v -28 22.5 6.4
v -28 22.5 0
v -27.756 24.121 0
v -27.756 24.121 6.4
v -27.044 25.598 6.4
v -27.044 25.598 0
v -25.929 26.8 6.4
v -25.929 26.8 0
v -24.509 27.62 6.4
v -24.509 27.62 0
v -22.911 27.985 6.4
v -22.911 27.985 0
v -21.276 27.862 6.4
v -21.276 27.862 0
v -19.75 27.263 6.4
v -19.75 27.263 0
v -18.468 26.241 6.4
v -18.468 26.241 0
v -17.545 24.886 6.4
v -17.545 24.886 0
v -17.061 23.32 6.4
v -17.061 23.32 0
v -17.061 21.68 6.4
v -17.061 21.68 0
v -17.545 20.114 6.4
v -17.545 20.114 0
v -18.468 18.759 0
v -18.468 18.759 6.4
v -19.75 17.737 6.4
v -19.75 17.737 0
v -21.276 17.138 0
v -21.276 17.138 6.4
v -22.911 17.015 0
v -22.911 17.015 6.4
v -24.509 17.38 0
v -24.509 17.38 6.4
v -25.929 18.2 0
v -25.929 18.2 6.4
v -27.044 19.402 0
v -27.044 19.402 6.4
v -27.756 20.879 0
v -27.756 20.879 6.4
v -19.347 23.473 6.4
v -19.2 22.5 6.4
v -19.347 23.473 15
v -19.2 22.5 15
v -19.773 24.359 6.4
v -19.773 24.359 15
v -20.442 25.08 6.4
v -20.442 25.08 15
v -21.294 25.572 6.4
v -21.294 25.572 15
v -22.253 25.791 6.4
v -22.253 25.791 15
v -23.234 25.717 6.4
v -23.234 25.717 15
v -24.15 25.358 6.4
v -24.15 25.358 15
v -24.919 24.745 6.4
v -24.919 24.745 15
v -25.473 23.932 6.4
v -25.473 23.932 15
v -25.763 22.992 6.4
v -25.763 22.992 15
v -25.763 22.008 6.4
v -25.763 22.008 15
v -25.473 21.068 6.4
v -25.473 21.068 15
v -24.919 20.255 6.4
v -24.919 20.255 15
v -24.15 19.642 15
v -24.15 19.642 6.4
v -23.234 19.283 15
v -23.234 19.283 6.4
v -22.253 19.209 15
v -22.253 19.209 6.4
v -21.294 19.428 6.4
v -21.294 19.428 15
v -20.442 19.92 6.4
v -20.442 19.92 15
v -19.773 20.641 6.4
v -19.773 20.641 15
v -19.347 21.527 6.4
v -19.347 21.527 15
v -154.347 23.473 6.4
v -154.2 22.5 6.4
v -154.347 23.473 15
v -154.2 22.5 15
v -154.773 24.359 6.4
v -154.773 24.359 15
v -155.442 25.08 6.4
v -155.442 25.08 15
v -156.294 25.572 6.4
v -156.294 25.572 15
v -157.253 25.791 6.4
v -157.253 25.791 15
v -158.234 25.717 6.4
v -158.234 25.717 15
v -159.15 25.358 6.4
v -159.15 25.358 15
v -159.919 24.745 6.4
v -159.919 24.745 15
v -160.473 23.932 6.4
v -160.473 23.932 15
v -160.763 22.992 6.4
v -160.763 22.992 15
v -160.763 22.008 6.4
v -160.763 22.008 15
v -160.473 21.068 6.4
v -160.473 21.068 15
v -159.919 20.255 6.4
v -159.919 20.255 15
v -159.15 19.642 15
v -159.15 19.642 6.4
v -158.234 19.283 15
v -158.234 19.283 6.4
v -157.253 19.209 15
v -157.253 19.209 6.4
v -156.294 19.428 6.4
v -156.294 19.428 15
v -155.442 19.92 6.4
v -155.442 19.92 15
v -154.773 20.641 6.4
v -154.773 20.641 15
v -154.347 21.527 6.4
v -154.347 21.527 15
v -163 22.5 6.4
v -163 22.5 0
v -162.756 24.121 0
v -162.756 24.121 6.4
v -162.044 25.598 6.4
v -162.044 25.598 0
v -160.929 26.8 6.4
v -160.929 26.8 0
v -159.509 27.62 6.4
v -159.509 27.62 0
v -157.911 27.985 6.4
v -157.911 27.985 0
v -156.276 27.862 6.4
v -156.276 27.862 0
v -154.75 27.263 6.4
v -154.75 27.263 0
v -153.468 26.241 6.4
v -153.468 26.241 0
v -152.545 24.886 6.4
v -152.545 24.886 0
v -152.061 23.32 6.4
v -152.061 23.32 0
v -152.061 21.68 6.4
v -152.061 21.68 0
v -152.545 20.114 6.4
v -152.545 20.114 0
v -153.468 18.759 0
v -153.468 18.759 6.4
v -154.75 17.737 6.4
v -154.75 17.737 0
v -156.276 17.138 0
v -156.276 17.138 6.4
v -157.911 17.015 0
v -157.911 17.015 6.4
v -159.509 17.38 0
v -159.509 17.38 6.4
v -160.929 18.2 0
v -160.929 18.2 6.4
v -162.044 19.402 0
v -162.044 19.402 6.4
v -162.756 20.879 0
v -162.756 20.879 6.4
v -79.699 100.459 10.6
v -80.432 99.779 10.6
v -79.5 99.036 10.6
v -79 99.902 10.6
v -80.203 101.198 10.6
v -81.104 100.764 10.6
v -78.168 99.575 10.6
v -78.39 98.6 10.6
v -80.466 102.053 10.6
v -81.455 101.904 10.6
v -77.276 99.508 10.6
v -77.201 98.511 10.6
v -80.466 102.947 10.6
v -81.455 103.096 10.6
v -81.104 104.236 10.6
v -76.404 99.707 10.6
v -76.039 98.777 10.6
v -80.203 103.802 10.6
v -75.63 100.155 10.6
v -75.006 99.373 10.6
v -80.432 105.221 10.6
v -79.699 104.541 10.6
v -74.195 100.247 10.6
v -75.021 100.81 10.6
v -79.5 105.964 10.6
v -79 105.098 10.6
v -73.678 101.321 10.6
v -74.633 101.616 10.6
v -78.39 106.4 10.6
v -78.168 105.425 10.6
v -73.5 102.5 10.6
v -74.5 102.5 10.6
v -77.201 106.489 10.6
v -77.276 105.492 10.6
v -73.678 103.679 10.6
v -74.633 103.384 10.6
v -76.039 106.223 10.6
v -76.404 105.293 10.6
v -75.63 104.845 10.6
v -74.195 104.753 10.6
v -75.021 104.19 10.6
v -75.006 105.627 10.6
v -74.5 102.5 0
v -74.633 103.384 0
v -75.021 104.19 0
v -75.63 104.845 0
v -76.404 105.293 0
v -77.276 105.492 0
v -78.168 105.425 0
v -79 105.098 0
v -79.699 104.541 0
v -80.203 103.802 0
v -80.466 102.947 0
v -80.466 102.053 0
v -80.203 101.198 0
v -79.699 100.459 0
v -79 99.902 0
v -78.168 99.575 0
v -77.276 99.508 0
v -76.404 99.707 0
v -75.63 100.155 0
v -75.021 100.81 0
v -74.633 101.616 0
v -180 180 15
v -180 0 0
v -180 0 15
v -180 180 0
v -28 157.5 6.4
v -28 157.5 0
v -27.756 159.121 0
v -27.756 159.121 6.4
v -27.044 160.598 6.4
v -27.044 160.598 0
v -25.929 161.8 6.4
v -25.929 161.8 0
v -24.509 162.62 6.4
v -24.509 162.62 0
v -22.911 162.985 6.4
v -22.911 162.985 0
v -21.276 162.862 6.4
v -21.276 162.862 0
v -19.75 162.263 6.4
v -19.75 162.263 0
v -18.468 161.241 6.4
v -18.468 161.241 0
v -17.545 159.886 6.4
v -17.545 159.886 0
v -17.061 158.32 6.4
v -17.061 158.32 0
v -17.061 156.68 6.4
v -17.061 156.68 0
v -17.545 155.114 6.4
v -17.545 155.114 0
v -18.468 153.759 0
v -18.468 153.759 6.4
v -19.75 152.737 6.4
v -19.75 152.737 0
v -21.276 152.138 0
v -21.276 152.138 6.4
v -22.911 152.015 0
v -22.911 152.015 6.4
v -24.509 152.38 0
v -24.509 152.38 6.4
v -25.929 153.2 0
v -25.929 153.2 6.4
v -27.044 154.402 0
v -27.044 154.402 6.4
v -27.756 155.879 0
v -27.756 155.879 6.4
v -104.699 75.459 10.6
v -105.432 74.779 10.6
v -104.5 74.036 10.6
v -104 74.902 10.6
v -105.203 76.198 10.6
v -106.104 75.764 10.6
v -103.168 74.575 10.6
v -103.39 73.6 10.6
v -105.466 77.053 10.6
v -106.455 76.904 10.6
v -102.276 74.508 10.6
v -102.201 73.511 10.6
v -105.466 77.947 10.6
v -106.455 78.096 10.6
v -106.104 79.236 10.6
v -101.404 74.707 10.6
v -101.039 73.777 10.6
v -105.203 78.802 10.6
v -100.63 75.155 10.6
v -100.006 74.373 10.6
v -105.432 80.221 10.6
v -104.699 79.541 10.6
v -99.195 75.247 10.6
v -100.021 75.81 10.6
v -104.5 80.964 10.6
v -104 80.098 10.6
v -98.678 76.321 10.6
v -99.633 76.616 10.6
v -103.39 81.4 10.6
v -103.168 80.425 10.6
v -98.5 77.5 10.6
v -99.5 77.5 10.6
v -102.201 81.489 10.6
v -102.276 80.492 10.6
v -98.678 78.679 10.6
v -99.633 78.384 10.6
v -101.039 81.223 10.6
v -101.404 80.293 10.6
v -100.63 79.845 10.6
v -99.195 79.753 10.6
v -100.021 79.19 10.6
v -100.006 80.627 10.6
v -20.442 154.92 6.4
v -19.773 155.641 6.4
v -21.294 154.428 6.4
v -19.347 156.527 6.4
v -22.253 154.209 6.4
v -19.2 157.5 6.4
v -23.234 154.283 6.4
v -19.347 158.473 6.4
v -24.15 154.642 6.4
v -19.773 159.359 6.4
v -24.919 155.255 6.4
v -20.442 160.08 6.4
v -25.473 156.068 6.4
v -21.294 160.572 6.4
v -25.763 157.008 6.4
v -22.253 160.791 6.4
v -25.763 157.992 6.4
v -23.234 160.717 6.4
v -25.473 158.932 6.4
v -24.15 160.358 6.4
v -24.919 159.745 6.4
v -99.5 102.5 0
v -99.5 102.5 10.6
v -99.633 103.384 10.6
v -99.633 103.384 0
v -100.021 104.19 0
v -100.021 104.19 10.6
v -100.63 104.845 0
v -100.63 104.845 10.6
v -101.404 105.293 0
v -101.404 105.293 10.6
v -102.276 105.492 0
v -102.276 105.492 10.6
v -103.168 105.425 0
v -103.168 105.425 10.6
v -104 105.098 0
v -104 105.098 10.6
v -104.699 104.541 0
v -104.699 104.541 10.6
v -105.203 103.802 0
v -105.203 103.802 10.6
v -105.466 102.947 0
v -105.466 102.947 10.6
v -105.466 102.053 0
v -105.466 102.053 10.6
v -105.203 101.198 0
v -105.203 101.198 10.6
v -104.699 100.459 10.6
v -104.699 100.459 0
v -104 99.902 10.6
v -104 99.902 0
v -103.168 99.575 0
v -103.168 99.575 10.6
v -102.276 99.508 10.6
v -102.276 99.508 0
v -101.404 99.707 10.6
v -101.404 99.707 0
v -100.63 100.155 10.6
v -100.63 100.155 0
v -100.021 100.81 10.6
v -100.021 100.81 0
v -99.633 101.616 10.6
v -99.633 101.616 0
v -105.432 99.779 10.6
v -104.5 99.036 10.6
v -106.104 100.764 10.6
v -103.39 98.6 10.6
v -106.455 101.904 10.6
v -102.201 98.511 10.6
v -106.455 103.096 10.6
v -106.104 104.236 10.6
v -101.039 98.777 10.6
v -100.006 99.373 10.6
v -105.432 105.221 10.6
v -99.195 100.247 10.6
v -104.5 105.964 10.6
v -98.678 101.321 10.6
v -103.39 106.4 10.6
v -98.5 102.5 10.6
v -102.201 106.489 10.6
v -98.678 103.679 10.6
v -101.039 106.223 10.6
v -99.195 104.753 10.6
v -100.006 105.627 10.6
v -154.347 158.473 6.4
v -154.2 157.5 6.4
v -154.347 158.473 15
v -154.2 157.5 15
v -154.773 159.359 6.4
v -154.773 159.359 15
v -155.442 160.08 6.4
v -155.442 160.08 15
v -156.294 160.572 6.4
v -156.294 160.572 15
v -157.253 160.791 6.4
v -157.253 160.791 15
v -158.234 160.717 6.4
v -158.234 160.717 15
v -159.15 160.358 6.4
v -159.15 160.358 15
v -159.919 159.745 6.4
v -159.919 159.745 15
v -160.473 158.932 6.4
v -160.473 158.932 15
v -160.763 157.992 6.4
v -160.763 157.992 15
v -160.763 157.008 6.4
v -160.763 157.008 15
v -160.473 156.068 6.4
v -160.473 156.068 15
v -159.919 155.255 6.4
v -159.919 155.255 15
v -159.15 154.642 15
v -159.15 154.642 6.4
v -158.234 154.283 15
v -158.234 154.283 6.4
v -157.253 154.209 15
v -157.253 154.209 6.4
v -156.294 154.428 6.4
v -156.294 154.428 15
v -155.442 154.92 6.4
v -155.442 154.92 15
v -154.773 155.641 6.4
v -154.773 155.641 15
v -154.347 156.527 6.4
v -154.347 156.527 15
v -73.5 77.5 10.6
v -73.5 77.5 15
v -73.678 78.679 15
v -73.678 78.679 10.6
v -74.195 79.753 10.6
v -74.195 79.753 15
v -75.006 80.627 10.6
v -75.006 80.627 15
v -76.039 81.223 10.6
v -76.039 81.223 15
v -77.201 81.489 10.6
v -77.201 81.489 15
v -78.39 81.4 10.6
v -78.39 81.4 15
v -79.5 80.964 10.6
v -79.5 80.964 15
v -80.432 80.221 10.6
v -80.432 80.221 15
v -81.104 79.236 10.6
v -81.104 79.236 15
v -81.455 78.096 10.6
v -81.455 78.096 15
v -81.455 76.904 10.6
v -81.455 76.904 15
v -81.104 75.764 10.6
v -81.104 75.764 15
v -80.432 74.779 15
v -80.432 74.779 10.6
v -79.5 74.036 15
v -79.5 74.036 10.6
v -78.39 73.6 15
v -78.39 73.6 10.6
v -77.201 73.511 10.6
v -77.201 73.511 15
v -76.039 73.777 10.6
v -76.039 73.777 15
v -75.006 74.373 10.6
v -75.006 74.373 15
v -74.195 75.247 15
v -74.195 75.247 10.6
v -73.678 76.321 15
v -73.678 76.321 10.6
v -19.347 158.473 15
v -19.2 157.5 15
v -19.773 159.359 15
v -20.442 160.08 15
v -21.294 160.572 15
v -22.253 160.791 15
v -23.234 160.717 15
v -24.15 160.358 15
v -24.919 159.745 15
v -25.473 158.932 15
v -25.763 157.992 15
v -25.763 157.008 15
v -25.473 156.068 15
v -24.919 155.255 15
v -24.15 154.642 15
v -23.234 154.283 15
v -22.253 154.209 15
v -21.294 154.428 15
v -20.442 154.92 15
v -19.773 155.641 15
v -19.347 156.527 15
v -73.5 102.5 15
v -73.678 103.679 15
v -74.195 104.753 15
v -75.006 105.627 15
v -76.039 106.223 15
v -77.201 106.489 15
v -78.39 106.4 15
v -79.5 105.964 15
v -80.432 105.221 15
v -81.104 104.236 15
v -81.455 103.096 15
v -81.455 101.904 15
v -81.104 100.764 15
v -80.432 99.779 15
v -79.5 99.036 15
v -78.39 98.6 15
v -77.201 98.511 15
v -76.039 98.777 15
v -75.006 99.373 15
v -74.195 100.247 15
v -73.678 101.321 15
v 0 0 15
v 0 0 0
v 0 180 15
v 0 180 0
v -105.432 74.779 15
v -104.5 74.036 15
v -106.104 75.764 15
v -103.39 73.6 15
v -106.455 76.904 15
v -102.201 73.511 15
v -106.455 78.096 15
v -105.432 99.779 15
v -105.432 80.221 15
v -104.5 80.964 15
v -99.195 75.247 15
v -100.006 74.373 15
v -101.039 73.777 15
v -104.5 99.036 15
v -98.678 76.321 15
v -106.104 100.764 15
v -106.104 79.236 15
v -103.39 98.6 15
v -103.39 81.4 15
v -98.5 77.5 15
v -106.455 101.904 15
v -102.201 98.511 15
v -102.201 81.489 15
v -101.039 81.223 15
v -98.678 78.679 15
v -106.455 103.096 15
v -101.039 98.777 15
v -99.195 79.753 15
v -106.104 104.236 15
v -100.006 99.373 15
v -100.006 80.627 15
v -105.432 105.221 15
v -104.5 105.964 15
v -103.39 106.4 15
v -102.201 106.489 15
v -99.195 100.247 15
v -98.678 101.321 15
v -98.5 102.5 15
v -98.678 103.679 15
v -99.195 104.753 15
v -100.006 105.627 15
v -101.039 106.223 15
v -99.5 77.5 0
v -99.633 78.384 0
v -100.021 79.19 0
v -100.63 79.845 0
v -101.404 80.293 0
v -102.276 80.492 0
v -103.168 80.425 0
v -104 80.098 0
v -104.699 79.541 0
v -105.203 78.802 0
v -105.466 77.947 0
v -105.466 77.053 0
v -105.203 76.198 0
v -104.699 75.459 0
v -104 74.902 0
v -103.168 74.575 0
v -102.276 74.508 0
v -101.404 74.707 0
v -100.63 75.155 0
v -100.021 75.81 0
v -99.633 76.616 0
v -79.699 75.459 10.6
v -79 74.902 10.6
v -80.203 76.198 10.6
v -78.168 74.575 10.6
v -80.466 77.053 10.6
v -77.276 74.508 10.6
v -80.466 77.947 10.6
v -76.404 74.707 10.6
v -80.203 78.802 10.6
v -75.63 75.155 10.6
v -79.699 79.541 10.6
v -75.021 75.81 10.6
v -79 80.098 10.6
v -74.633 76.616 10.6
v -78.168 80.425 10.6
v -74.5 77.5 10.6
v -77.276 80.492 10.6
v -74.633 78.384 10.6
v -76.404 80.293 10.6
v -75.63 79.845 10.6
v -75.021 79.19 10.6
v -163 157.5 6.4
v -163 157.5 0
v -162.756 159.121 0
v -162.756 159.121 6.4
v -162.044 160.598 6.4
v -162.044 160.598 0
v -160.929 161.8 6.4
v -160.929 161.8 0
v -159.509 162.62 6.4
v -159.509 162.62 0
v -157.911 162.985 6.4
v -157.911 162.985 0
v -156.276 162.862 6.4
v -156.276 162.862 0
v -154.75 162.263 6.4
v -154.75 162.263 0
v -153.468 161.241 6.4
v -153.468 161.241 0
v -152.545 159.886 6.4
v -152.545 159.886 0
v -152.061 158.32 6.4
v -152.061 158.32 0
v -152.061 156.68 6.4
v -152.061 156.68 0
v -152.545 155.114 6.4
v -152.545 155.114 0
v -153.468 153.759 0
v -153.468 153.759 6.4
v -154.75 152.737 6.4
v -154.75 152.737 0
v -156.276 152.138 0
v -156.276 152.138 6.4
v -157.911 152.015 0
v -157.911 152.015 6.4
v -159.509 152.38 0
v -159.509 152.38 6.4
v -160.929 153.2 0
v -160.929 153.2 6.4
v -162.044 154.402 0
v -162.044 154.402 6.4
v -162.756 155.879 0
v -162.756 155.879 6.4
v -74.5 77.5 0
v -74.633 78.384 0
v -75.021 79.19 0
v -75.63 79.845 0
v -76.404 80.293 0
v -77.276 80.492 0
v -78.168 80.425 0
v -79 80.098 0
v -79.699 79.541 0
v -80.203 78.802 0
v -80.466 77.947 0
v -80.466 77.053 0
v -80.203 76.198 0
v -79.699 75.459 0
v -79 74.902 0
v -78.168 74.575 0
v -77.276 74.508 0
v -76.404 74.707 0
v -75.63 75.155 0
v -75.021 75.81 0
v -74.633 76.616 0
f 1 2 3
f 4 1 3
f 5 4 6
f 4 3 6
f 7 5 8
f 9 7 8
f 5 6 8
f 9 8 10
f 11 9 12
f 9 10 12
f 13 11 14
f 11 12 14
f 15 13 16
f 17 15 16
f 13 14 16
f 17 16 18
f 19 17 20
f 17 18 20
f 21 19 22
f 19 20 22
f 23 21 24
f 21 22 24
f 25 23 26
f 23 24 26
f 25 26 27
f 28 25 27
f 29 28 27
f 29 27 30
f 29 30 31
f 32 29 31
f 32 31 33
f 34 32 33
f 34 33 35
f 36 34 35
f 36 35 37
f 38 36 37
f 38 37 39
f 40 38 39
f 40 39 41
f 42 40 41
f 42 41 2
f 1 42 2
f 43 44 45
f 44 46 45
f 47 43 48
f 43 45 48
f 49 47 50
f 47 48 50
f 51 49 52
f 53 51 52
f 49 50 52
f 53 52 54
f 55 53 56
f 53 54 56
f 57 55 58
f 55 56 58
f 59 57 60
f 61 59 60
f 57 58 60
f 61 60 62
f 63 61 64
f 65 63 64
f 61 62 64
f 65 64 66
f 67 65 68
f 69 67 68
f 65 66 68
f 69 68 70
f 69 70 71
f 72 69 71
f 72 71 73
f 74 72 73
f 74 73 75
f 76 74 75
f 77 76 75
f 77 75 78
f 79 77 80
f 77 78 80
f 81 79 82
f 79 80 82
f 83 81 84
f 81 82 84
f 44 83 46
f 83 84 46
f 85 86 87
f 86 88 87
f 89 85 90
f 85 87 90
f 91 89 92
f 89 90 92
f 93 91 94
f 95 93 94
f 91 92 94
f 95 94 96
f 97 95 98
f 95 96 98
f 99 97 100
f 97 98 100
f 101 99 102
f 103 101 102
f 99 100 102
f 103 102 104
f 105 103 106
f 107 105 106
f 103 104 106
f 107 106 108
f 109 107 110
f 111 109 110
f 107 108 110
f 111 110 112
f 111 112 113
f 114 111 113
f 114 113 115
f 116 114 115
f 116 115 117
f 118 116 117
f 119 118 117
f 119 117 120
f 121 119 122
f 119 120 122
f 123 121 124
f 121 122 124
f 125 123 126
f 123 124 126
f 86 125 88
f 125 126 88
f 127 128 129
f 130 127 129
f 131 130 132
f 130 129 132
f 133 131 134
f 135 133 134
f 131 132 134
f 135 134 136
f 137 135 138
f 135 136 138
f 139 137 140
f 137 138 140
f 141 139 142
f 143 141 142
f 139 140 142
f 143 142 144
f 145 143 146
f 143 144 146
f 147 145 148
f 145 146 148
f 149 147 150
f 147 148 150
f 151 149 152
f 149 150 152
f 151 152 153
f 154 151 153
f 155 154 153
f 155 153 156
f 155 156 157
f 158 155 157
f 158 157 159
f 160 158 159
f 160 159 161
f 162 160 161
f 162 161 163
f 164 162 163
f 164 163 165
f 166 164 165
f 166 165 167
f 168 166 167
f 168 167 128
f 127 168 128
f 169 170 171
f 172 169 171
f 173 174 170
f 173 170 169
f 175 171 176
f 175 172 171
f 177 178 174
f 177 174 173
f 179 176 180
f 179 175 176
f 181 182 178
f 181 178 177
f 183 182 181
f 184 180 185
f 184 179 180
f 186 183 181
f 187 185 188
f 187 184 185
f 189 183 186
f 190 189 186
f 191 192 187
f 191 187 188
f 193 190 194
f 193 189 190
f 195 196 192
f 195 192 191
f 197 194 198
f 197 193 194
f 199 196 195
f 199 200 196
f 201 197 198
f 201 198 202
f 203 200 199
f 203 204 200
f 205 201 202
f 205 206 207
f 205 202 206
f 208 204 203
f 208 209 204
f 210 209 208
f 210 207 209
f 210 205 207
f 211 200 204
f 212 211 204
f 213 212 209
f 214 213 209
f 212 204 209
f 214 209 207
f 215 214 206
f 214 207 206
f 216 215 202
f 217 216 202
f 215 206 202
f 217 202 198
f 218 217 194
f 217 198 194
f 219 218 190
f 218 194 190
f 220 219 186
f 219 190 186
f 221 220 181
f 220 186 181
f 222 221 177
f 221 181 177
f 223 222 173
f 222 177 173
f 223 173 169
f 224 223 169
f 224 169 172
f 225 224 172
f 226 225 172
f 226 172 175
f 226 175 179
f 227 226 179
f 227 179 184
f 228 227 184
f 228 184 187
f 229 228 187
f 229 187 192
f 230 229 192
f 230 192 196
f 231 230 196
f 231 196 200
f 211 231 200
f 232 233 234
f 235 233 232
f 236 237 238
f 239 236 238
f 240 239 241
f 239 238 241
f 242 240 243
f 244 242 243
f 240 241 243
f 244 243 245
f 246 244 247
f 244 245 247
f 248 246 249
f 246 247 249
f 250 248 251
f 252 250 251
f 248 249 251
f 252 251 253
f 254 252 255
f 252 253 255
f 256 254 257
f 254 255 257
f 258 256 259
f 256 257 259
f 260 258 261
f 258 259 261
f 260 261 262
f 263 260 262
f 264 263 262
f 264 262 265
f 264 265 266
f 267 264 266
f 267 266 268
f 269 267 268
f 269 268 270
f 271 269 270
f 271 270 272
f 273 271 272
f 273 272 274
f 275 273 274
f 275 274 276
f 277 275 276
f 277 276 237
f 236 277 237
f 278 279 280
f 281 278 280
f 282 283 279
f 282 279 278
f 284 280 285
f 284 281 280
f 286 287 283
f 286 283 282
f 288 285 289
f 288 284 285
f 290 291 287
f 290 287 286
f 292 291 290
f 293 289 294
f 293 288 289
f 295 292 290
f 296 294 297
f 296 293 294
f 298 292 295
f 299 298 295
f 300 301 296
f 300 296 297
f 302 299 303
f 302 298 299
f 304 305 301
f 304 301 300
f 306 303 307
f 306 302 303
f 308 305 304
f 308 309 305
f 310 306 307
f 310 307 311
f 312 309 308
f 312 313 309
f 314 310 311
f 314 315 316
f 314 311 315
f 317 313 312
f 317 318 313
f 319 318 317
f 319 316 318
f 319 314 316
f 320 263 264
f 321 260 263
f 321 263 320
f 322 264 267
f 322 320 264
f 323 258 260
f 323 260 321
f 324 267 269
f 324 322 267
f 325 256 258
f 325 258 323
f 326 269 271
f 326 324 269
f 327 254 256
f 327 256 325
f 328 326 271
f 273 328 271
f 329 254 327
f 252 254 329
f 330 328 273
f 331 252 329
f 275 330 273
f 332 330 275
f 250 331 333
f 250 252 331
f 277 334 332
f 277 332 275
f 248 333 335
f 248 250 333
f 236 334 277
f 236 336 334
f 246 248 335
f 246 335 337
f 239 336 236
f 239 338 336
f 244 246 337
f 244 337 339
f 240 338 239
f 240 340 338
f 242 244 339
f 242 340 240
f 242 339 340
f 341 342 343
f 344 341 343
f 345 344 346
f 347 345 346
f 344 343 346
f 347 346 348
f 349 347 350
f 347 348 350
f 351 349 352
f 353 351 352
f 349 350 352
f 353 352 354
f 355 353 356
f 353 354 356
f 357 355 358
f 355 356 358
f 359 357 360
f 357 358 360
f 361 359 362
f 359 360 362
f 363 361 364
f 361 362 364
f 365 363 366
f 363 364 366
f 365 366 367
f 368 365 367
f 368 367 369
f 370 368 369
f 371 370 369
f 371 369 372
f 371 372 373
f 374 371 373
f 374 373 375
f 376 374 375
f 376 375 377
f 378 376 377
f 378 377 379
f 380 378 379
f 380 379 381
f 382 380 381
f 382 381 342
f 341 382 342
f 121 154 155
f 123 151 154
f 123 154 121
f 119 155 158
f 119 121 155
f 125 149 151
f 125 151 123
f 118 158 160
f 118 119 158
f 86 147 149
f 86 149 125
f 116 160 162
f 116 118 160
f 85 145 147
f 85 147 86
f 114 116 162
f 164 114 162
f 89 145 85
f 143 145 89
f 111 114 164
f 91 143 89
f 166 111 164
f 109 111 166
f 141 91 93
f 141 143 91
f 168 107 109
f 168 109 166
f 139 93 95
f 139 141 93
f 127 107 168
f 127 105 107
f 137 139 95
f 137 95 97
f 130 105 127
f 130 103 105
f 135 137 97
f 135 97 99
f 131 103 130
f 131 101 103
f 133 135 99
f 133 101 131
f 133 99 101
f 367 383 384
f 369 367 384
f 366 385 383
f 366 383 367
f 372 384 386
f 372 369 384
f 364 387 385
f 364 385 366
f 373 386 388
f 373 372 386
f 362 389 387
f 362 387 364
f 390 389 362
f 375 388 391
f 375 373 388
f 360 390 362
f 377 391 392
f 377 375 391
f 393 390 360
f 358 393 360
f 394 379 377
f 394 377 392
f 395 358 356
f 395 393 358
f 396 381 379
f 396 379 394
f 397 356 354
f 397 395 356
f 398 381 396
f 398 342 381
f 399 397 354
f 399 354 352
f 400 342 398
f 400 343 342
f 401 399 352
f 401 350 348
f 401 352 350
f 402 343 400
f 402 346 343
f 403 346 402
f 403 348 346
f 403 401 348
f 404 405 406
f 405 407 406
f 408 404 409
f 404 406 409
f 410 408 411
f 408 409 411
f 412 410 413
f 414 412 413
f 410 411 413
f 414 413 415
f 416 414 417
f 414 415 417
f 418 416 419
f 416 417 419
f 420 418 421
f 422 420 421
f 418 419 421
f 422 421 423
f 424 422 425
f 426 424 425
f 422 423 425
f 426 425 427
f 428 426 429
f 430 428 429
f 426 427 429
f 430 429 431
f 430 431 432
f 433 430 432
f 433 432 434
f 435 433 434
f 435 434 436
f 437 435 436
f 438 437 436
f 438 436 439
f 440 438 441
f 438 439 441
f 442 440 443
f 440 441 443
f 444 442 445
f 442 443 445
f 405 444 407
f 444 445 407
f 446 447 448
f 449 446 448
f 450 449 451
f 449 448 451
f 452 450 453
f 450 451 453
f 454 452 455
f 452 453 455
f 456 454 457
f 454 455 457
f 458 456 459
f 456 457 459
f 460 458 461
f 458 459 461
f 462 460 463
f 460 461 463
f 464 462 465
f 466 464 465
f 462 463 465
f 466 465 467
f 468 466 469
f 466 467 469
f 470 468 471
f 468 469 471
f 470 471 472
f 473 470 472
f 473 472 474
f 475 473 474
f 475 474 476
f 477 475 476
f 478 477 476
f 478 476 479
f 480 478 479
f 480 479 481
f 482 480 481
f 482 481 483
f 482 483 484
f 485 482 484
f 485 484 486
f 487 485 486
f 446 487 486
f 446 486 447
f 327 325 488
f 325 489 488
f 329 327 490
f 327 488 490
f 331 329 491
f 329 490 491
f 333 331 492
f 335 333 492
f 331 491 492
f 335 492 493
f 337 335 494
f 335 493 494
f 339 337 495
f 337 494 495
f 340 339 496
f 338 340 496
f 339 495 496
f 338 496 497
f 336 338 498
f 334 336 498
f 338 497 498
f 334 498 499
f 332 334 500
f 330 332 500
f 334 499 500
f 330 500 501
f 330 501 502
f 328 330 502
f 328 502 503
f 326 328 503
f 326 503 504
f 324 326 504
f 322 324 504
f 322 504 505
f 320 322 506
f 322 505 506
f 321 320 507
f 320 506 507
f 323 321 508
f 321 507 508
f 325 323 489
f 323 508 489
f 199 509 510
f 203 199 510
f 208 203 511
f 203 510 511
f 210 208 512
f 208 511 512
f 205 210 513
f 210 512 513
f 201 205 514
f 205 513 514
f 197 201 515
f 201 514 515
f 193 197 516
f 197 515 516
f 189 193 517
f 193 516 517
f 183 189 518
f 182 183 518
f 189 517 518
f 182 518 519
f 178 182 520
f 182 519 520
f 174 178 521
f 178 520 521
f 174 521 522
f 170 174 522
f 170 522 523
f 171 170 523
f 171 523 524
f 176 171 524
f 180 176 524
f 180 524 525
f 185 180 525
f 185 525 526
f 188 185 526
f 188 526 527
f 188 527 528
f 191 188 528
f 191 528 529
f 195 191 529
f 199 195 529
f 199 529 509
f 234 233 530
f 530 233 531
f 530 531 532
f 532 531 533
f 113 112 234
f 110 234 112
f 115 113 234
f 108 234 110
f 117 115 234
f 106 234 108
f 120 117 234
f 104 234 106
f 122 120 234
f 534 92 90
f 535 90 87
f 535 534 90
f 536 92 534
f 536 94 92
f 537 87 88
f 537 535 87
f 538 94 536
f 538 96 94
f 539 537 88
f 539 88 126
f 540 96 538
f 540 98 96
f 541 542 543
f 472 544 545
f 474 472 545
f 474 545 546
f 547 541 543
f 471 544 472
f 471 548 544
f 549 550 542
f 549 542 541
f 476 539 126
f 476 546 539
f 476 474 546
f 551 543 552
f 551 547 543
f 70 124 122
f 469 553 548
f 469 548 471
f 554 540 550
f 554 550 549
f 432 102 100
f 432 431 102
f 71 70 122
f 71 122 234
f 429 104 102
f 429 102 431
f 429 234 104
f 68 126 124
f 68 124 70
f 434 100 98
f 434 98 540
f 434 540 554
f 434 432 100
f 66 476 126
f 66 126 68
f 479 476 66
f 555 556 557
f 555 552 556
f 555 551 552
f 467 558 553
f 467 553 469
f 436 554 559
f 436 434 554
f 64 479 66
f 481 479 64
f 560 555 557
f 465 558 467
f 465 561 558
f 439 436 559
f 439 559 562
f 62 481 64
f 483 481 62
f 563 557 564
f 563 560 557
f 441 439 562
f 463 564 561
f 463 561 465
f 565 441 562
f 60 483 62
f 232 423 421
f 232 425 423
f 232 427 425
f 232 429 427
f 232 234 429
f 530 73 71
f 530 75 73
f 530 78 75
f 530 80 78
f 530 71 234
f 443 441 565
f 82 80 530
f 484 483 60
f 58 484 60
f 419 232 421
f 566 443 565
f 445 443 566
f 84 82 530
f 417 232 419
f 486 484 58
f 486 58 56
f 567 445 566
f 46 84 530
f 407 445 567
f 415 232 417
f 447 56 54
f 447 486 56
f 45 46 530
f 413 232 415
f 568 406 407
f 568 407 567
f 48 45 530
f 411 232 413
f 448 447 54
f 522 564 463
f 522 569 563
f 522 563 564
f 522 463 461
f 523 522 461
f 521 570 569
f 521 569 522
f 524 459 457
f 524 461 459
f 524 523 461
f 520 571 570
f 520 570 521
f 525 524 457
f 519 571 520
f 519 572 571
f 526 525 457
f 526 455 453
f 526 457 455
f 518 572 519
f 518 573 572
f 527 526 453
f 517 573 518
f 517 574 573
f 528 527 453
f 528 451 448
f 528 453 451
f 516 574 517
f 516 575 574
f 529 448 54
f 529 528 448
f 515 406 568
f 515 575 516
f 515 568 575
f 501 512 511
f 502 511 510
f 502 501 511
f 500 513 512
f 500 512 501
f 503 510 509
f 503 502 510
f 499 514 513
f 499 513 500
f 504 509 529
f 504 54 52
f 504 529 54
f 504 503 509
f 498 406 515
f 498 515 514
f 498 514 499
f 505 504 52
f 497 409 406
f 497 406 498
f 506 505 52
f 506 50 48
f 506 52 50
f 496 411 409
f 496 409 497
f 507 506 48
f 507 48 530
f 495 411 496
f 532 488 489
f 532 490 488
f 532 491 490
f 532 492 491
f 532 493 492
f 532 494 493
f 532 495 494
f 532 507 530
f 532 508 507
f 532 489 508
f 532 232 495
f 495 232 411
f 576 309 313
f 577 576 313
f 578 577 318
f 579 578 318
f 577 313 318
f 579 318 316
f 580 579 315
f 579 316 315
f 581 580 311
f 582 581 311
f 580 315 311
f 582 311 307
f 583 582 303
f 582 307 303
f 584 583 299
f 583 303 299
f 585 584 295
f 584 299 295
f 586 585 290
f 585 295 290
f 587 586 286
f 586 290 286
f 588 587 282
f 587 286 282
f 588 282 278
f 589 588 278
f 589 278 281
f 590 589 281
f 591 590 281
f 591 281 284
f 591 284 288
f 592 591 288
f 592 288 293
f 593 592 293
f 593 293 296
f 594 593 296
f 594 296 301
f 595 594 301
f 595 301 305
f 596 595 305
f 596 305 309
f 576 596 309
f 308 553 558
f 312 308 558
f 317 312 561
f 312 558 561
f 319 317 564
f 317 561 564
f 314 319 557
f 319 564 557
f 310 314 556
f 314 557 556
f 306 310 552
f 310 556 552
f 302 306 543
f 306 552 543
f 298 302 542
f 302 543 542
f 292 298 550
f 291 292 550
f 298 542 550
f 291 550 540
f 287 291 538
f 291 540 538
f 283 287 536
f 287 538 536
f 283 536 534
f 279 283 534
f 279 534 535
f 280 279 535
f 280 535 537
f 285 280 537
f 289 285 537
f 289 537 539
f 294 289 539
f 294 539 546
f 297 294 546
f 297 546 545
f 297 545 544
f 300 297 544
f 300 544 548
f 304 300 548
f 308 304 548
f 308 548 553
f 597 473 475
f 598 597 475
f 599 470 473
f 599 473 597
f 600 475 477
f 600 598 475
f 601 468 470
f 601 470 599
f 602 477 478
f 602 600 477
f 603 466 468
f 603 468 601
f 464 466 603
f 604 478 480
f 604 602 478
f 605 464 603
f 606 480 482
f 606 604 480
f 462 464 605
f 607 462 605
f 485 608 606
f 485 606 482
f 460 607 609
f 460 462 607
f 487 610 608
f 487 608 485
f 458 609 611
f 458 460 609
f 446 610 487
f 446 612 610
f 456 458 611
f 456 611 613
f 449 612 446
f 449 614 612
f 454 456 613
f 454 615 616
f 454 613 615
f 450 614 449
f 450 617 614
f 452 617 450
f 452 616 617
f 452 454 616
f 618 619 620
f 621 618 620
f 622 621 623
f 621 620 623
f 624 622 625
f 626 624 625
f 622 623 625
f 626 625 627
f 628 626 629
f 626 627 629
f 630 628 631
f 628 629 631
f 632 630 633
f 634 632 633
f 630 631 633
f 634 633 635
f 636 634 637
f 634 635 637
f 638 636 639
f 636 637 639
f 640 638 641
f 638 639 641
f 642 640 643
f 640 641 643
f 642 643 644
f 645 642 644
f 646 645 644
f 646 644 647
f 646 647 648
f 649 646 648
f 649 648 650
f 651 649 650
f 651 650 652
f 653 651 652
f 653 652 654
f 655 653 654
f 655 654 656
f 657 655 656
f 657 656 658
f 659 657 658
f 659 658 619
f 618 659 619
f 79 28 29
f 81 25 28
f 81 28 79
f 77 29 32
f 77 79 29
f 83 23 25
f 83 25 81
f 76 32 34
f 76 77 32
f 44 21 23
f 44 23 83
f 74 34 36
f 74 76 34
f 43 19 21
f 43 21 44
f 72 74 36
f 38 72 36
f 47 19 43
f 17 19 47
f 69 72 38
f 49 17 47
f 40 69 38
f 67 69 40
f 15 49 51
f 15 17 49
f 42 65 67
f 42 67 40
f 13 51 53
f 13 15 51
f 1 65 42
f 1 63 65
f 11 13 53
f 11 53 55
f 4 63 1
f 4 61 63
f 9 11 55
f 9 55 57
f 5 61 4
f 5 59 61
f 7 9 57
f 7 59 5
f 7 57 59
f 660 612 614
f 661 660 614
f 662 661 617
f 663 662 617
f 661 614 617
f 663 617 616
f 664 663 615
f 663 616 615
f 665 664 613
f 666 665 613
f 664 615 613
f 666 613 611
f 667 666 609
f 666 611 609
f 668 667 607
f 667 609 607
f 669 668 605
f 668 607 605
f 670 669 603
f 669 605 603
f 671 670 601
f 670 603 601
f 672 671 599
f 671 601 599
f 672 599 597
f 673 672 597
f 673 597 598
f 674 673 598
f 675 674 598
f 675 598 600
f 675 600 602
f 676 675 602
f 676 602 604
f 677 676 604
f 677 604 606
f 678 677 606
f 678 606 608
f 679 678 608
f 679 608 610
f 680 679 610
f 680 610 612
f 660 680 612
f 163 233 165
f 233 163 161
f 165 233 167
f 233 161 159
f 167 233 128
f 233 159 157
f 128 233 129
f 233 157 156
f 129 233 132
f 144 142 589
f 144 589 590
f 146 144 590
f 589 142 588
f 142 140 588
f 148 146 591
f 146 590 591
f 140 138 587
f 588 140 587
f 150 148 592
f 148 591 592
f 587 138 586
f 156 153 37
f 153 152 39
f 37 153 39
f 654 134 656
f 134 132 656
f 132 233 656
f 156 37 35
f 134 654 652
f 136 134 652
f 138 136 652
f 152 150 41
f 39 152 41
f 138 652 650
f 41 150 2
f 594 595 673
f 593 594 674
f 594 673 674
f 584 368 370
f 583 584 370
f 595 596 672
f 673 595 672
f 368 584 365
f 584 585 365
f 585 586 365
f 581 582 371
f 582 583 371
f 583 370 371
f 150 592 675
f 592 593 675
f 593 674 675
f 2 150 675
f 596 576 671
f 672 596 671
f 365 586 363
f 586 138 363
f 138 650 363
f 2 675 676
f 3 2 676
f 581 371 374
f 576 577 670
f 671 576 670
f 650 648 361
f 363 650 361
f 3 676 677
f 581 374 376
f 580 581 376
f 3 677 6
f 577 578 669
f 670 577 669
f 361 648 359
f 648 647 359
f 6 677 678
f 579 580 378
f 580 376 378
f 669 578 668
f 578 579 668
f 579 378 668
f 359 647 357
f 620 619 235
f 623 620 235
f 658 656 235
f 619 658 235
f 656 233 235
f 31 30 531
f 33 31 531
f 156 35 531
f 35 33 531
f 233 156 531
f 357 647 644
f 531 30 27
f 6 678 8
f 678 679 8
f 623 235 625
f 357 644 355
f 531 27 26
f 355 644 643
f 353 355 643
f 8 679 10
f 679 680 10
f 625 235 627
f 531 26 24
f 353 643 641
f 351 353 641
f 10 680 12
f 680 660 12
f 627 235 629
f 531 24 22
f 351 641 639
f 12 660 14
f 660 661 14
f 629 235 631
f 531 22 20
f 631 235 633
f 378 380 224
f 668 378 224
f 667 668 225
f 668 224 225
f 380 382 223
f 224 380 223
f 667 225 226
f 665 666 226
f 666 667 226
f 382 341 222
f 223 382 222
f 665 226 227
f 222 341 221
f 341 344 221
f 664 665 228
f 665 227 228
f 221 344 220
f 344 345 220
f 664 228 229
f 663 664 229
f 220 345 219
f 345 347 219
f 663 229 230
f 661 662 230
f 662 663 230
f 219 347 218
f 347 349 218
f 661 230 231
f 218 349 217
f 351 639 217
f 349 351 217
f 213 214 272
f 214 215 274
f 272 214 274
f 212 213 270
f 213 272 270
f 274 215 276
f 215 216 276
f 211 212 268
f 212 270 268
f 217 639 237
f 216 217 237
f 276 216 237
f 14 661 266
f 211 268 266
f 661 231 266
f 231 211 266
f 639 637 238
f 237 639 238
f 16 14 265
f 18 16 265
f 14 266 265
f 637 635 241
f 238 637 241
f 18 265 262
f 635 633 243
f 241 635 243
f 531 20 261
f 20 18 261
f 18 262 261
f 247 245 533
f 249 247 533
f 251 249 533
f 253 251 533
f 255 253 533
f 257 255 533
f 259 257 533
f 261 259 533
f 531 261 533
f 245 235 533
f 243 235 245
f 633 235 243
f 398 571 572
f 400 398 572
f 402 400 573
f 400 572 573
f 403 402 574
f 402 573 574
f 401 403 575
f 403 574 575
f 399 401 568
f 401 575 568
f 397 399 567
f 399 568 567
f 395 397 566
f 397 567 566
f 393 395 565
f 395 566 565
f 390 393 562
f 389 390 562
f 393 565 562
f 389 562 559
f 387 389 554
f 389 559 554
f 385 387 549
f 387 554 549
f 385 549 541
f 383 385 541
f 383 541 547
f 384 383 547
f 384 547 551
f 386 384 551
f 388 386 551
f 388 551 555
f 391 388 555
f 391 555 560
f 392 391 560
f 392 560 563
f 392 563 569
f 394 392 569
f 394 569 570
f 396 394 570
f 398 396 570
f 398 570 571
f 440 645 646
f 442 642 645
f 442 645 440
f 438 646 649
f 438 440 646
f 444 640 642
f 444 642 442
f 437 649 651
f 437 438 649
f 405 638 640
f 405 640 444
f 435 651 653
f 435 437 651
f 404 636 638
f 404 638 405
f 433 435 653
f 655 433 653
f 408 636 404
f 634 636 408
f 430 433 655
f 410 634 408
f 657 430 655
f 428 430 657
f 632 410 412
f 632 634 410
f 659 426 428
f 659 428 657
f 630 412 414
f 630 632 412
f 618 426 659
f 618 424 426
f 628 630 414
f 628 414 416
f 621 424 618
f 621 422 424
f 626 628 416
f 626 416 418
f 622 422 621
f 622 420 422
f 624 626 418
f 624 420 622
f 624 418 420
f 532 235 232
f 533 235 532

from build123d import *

# Parameters (mm, degrees)
ESQUISSE1_W                                        = 180
ESQUISSE1_H                                        = 180
ESQUISSE1_R                                        = 3
BOSS_EXTRU_1_DEPTH                                 = 15
ESQUISSE6_R                                        = 3
ENL_V_MAT_EXTRU_1_DEPTH                            = 16
CHAMBRAGE_POUR_VIS_T_TE_HEXAGONALE_M41_D           = 4.5
CHAMBRAGE_POUR_VIS_T_TE_HEXAGONALE_M41_CBORE_D     = 8
CHAMBRAGE_POUR_VIS_T_TE_HEXAGONALE_M41_CBORE_DEPTH = 4.4
CHAMBRAGE_POUR_VIS_T_TE_HEXAGONALE_M62_D           = 6.6
CHAMBRAGE_POUR_VIS_T_TE_HEXAGONALE_M62_CBORE_D     = 11
CHAMBRAGE_POUR_VIS_T_TE_HEXAGONALE_M62_CBORE_DEPTH = 6.4


with BuildPart() as part:
    # Esquisse1 → Boss.-Extru.1 (new body)
    with BuildSketch(Plane.XY):
        with Locations((-90, 90)):
            Rectangle(ESQUISSE1_W, ESQUISSE1_H)
        with Locations((-22.5, 22.5)):
            Circle(ESQUISSE1_R, mode=Mode.SUBTRACT)
        with Locations((-157.5, 22.5)):
            Circle(ESQUISSE1_R, mode=Mode.SUBTRACT)
        with Locations((-157.5, 157.5)):
            Circle(ESQUISSE1_R, mode=Mode.SUBTRACT)
        with Locations((-22.5, 157.5)):
            Circle(ESQUISSE1_R, mode=Mode.SUBTRACT)
    extrude(amount=BOSS_EXTRU_1_DEPTH)

    # Esquisse6 → Enlèv. mat.-Extru.1 (cut, through all)
    with BuildSketch(Plane.XY.offset(15)):
        with Locations((-102.5, 77.5)):
            Circle(ESQUISSE6_R)
        with Locations((-77.5, 77.5)):
            Circle(ESQUISSE6_R)
        with Locations((-77.5, 102.5)):
            Circle(ESQUISSE6_R)
        with Locations((-102.5, 102.5)):
            Circle(ESQUISSE6_R)
    extrude(amount=-ENL_V_MAT_EXTRU_1_DEPTH, mode=Mode.SUBTRACT)

    # Chambrage pour vis à tête hexagonale M41 (through all)
    with Locations(Plane.XY.offset(15)):
        with Locations((-102.5, 77.5), (-102.5, 102.5), (-77.5, 102.5), (-77.5, 77.5)):
            CounterBoreHole(CHAMBRAGE_POUR_VIS_T_TE_HEXAGONALE_M41_D / 2, CHAMBRAGE_POUR_VIS_T_TE_HEXAGONALE_M41_CBORE_D / 2, CHAMBRAGE_POUR_VIS_T_TE_HEXAGONALE_M41_CBORE_DEPTH)

    # Chambrage pour vis à tête hexagonale M62 (through all)
    with Locations(Plane(origin=(0, 0, 0), x_dir=(-1, 0, 0), z_dir=(0, 0, -1))):
        with Locations((157.5, 22.5), (22.5, 22.5), (22.5, 157.5), (157.5, 157.5)):
            CounterBoreHole(CHAMBRAGE_POUR_VIS_T_TE_HEXAGONALE_M62_D / 2, CHAMBRAGE_POUR_VIS_T_TE_HEXAGONALE_M62_CBORE_D / 2, CHAMBRAGE_POUR_VIS_T_TE_HEXAGONALE_M62_CBORE_DEPTH)


solid = part.part
